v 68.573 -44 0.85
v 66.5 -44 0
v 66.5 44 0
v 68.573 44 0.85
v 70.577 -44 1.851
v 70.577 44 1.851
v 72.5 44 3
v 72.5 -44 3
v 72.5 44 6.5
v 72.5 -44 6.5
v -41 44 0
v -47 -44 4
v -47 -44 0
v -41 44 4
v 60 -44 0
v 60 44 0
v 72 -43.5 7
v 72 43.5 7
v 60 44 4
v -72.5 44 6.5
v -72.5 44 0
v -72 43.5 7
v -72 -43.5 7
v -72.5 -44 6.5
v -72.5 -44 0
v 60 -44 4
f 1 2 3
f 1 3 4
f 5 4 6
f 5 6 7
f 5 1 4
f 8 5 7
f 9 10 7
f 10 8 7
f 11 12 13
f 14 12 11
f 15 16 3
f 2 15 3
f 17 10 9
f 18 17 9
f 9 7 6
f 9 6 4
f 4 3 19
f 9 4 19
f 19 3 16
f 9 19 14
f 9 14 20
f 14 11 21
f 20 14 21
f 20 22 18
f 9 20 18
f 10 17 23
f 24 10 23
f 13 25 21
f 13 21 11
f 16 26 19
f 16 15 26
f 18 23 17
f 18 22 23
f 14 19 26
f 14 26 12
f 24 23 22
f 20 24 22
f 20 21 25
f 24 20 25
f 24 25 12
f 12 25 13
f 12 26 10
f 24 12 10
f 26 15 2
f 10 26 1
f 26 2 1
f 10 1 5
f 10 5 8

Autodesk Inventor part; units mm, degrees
ref_plane "YZ Plane" through (0, 0, 0) normal (1, 0, 0) x (0, 1, 0)
ref_plane "XZ Plane" through (0, 0, 0) normal (0, 1, 0) x (-1, 0, 0)
ref_plane "XY Plane" through (0, 0, 0) normal (0, 0, 1) x (1, 0, 0)
sketch "Sketch1" plane through (0, 0, 0) normal (0, 0, 1) x (1, 0, 0)
  line L0 (-72.5, -44) -> (72.5, -44)
  line L1 (72.5, -44) -> (72.5, 44)
  line L2 (72.5, 44) -> (-72.5, 44)
  line L3 (-72.5, 44) -> (-72.5, -44)
  line L4 (-72.5, -44) -> (72.5, 44) construction
  line L5 (72.5, -44) -> (-72.5, 44) construction
  point P0 (0, 0)
  dimension "d0" = 145
  dimension "d1" = 88
extrude "Extrusion1" add sketch "Sketch1" along normal blind 7
sketch "Sketch2" plane through (0, 0, 7) normal (0, 0, 1) x (1, 0, 0)
  line L0 (-24.5465, 44) -> (-40.0633, -44) construction
  line L1 (18.9535, 44) -> (3.4367, -44) construction
  line L2 (72.5, 44) -> (-72.5, 44) projected
  line L3 (-72.5, -44) -> (72.5, -44) projected
  circle A0 centre (6.3902, -27.25) radius 1.75
  circle A1 centre (-27.5, 27.25) radius 1.75
  line L4 (-72.5, 44) -> (-72.5, -44) projected
  point P0 (0, 0)
  dimension "d4" = 80
  dimension "d5" = 43.5
  dimension "d6" = 3.5
  dimension "d7" = 3.5
  dimension "d8" = 54.5
  dimension "d9" = 16.75
  dimension "d10" = 88
  dimension "d11" = 45
sketch "Sketch3" plane through (0, 0, 0) normal (0, 0, -1) x (-1, 0, 0)
  line L0 (72.5, -44) -> (-72.5, -44) projected
  line L1 (-72.5, 44) -> (72.5, 44) projected
  line L2 (40, -44) -> (-60, -44)
  line L3 (-60, -44) -> (-60, 44)
  line L4 (-60, 44) -> (40, 44)
  line L5 (40, 44) -> (40, -44)
  line L6 (-72.5, -44) -> (-72.5, 44) projected
  line L7 (72.5, 44) -> (72.5, -44) projected
  point P0 (0, 0)
  point P1 (40, 44)
  point P2 (-60, -44)
  dimension "d14" = 100
  dimension "d15" = 145
  dimension "d16" = 32.5
extrude "Extrusion3" cut sketch "Sketch3" against normal blind 4 contours L0 L3 L1 L5
sketch "Sketch5" plane through (-72.5, -44, 7) normal (0, -1, 0) x (1, 0, 0)
  line L0 (145, -7) -> (132.5, -7) projected
  arc A0 (139, -7) -> (145, -4) centre (128.6677, 21.1646) ccw
  line L1 (145, -7) -> (145, 0) projected
  line L2 (132.5, -7) -> (145, -7) projected
  line L3 (132.5, -3) -> (132.5, -7) projected
  point P0 (72.5, -7)
  point P1 (132.5, -4)
  point P2 (139, -7)
  dimension "d25" = 4
  dimension "d26" = 6.5
  dimension "d27" = 30
extrude "Extrusion5" cut sketch "Sketch5" against normal through all
chamfer "Chamfer1" distance 0.5 angle 45 4 edges at (-72.5, 0, 7) (0, 44, 7) (72.5, 0, 7) (0, -44, 7)
sketch "Sketch7" plane through (0, 0, 4) normal (0, 0, -1) x (-1, 0, 0)
  line L0 (72.5, -44) -> (40, -44) projected
  line L1 (40, 44) -> (72.5, 44) projected
  line L2 (40, -44) -> (-60, -44) projected
  line L3 (40, -44) -> (40, 44)
  line L4 (40, -44) -> (47, -44)
  line L5 (47, -44) -> (41, 44)
  line L6 (41, 44) -> (40, 44)
  point P0 (0, 0)
  dimension "d34" = 7
  dimension "d35" = 1
extrude "Extrusion6" cut sketch "Sketch7" along normal through all
sketch "Sketch8" plane through (60, -44, 0) normal (0, -1, 0) x (1, 0, 0)
  point P0 (-60, 0)
ref_plane "Work Plane1" through (-47, -44, 2) normal (0.068, 0.9977, 0) x (0, 0, 1)
sketch "Sketch9" plane through (-47, -44, 2) normal (0.068, 0.9977, 0) x (0, 0, 1)
  line L0 (2, 0) -> (2, 106.7522) projected
  line L1 (2, 0) -> (-1, 20) construction
  line L2 (-1, 20) -> (-1, 54) construction
  line L3 (2, 106.7522) -> (2, 100.7661) projected
  line L4 (-1, 54) -> (2, 106.7522) construction
  spline S0 degree 3 poles (2, 0) (-1, 20) (-1, 54) (2, 106.7522) knots 1 1 1 1 2 2 2 2
  point P0 (-2, 43.8981)
equation "\"d9\" = -0.5 * d8 + 0.5 * d10"
properties part number "_3DPrint"
